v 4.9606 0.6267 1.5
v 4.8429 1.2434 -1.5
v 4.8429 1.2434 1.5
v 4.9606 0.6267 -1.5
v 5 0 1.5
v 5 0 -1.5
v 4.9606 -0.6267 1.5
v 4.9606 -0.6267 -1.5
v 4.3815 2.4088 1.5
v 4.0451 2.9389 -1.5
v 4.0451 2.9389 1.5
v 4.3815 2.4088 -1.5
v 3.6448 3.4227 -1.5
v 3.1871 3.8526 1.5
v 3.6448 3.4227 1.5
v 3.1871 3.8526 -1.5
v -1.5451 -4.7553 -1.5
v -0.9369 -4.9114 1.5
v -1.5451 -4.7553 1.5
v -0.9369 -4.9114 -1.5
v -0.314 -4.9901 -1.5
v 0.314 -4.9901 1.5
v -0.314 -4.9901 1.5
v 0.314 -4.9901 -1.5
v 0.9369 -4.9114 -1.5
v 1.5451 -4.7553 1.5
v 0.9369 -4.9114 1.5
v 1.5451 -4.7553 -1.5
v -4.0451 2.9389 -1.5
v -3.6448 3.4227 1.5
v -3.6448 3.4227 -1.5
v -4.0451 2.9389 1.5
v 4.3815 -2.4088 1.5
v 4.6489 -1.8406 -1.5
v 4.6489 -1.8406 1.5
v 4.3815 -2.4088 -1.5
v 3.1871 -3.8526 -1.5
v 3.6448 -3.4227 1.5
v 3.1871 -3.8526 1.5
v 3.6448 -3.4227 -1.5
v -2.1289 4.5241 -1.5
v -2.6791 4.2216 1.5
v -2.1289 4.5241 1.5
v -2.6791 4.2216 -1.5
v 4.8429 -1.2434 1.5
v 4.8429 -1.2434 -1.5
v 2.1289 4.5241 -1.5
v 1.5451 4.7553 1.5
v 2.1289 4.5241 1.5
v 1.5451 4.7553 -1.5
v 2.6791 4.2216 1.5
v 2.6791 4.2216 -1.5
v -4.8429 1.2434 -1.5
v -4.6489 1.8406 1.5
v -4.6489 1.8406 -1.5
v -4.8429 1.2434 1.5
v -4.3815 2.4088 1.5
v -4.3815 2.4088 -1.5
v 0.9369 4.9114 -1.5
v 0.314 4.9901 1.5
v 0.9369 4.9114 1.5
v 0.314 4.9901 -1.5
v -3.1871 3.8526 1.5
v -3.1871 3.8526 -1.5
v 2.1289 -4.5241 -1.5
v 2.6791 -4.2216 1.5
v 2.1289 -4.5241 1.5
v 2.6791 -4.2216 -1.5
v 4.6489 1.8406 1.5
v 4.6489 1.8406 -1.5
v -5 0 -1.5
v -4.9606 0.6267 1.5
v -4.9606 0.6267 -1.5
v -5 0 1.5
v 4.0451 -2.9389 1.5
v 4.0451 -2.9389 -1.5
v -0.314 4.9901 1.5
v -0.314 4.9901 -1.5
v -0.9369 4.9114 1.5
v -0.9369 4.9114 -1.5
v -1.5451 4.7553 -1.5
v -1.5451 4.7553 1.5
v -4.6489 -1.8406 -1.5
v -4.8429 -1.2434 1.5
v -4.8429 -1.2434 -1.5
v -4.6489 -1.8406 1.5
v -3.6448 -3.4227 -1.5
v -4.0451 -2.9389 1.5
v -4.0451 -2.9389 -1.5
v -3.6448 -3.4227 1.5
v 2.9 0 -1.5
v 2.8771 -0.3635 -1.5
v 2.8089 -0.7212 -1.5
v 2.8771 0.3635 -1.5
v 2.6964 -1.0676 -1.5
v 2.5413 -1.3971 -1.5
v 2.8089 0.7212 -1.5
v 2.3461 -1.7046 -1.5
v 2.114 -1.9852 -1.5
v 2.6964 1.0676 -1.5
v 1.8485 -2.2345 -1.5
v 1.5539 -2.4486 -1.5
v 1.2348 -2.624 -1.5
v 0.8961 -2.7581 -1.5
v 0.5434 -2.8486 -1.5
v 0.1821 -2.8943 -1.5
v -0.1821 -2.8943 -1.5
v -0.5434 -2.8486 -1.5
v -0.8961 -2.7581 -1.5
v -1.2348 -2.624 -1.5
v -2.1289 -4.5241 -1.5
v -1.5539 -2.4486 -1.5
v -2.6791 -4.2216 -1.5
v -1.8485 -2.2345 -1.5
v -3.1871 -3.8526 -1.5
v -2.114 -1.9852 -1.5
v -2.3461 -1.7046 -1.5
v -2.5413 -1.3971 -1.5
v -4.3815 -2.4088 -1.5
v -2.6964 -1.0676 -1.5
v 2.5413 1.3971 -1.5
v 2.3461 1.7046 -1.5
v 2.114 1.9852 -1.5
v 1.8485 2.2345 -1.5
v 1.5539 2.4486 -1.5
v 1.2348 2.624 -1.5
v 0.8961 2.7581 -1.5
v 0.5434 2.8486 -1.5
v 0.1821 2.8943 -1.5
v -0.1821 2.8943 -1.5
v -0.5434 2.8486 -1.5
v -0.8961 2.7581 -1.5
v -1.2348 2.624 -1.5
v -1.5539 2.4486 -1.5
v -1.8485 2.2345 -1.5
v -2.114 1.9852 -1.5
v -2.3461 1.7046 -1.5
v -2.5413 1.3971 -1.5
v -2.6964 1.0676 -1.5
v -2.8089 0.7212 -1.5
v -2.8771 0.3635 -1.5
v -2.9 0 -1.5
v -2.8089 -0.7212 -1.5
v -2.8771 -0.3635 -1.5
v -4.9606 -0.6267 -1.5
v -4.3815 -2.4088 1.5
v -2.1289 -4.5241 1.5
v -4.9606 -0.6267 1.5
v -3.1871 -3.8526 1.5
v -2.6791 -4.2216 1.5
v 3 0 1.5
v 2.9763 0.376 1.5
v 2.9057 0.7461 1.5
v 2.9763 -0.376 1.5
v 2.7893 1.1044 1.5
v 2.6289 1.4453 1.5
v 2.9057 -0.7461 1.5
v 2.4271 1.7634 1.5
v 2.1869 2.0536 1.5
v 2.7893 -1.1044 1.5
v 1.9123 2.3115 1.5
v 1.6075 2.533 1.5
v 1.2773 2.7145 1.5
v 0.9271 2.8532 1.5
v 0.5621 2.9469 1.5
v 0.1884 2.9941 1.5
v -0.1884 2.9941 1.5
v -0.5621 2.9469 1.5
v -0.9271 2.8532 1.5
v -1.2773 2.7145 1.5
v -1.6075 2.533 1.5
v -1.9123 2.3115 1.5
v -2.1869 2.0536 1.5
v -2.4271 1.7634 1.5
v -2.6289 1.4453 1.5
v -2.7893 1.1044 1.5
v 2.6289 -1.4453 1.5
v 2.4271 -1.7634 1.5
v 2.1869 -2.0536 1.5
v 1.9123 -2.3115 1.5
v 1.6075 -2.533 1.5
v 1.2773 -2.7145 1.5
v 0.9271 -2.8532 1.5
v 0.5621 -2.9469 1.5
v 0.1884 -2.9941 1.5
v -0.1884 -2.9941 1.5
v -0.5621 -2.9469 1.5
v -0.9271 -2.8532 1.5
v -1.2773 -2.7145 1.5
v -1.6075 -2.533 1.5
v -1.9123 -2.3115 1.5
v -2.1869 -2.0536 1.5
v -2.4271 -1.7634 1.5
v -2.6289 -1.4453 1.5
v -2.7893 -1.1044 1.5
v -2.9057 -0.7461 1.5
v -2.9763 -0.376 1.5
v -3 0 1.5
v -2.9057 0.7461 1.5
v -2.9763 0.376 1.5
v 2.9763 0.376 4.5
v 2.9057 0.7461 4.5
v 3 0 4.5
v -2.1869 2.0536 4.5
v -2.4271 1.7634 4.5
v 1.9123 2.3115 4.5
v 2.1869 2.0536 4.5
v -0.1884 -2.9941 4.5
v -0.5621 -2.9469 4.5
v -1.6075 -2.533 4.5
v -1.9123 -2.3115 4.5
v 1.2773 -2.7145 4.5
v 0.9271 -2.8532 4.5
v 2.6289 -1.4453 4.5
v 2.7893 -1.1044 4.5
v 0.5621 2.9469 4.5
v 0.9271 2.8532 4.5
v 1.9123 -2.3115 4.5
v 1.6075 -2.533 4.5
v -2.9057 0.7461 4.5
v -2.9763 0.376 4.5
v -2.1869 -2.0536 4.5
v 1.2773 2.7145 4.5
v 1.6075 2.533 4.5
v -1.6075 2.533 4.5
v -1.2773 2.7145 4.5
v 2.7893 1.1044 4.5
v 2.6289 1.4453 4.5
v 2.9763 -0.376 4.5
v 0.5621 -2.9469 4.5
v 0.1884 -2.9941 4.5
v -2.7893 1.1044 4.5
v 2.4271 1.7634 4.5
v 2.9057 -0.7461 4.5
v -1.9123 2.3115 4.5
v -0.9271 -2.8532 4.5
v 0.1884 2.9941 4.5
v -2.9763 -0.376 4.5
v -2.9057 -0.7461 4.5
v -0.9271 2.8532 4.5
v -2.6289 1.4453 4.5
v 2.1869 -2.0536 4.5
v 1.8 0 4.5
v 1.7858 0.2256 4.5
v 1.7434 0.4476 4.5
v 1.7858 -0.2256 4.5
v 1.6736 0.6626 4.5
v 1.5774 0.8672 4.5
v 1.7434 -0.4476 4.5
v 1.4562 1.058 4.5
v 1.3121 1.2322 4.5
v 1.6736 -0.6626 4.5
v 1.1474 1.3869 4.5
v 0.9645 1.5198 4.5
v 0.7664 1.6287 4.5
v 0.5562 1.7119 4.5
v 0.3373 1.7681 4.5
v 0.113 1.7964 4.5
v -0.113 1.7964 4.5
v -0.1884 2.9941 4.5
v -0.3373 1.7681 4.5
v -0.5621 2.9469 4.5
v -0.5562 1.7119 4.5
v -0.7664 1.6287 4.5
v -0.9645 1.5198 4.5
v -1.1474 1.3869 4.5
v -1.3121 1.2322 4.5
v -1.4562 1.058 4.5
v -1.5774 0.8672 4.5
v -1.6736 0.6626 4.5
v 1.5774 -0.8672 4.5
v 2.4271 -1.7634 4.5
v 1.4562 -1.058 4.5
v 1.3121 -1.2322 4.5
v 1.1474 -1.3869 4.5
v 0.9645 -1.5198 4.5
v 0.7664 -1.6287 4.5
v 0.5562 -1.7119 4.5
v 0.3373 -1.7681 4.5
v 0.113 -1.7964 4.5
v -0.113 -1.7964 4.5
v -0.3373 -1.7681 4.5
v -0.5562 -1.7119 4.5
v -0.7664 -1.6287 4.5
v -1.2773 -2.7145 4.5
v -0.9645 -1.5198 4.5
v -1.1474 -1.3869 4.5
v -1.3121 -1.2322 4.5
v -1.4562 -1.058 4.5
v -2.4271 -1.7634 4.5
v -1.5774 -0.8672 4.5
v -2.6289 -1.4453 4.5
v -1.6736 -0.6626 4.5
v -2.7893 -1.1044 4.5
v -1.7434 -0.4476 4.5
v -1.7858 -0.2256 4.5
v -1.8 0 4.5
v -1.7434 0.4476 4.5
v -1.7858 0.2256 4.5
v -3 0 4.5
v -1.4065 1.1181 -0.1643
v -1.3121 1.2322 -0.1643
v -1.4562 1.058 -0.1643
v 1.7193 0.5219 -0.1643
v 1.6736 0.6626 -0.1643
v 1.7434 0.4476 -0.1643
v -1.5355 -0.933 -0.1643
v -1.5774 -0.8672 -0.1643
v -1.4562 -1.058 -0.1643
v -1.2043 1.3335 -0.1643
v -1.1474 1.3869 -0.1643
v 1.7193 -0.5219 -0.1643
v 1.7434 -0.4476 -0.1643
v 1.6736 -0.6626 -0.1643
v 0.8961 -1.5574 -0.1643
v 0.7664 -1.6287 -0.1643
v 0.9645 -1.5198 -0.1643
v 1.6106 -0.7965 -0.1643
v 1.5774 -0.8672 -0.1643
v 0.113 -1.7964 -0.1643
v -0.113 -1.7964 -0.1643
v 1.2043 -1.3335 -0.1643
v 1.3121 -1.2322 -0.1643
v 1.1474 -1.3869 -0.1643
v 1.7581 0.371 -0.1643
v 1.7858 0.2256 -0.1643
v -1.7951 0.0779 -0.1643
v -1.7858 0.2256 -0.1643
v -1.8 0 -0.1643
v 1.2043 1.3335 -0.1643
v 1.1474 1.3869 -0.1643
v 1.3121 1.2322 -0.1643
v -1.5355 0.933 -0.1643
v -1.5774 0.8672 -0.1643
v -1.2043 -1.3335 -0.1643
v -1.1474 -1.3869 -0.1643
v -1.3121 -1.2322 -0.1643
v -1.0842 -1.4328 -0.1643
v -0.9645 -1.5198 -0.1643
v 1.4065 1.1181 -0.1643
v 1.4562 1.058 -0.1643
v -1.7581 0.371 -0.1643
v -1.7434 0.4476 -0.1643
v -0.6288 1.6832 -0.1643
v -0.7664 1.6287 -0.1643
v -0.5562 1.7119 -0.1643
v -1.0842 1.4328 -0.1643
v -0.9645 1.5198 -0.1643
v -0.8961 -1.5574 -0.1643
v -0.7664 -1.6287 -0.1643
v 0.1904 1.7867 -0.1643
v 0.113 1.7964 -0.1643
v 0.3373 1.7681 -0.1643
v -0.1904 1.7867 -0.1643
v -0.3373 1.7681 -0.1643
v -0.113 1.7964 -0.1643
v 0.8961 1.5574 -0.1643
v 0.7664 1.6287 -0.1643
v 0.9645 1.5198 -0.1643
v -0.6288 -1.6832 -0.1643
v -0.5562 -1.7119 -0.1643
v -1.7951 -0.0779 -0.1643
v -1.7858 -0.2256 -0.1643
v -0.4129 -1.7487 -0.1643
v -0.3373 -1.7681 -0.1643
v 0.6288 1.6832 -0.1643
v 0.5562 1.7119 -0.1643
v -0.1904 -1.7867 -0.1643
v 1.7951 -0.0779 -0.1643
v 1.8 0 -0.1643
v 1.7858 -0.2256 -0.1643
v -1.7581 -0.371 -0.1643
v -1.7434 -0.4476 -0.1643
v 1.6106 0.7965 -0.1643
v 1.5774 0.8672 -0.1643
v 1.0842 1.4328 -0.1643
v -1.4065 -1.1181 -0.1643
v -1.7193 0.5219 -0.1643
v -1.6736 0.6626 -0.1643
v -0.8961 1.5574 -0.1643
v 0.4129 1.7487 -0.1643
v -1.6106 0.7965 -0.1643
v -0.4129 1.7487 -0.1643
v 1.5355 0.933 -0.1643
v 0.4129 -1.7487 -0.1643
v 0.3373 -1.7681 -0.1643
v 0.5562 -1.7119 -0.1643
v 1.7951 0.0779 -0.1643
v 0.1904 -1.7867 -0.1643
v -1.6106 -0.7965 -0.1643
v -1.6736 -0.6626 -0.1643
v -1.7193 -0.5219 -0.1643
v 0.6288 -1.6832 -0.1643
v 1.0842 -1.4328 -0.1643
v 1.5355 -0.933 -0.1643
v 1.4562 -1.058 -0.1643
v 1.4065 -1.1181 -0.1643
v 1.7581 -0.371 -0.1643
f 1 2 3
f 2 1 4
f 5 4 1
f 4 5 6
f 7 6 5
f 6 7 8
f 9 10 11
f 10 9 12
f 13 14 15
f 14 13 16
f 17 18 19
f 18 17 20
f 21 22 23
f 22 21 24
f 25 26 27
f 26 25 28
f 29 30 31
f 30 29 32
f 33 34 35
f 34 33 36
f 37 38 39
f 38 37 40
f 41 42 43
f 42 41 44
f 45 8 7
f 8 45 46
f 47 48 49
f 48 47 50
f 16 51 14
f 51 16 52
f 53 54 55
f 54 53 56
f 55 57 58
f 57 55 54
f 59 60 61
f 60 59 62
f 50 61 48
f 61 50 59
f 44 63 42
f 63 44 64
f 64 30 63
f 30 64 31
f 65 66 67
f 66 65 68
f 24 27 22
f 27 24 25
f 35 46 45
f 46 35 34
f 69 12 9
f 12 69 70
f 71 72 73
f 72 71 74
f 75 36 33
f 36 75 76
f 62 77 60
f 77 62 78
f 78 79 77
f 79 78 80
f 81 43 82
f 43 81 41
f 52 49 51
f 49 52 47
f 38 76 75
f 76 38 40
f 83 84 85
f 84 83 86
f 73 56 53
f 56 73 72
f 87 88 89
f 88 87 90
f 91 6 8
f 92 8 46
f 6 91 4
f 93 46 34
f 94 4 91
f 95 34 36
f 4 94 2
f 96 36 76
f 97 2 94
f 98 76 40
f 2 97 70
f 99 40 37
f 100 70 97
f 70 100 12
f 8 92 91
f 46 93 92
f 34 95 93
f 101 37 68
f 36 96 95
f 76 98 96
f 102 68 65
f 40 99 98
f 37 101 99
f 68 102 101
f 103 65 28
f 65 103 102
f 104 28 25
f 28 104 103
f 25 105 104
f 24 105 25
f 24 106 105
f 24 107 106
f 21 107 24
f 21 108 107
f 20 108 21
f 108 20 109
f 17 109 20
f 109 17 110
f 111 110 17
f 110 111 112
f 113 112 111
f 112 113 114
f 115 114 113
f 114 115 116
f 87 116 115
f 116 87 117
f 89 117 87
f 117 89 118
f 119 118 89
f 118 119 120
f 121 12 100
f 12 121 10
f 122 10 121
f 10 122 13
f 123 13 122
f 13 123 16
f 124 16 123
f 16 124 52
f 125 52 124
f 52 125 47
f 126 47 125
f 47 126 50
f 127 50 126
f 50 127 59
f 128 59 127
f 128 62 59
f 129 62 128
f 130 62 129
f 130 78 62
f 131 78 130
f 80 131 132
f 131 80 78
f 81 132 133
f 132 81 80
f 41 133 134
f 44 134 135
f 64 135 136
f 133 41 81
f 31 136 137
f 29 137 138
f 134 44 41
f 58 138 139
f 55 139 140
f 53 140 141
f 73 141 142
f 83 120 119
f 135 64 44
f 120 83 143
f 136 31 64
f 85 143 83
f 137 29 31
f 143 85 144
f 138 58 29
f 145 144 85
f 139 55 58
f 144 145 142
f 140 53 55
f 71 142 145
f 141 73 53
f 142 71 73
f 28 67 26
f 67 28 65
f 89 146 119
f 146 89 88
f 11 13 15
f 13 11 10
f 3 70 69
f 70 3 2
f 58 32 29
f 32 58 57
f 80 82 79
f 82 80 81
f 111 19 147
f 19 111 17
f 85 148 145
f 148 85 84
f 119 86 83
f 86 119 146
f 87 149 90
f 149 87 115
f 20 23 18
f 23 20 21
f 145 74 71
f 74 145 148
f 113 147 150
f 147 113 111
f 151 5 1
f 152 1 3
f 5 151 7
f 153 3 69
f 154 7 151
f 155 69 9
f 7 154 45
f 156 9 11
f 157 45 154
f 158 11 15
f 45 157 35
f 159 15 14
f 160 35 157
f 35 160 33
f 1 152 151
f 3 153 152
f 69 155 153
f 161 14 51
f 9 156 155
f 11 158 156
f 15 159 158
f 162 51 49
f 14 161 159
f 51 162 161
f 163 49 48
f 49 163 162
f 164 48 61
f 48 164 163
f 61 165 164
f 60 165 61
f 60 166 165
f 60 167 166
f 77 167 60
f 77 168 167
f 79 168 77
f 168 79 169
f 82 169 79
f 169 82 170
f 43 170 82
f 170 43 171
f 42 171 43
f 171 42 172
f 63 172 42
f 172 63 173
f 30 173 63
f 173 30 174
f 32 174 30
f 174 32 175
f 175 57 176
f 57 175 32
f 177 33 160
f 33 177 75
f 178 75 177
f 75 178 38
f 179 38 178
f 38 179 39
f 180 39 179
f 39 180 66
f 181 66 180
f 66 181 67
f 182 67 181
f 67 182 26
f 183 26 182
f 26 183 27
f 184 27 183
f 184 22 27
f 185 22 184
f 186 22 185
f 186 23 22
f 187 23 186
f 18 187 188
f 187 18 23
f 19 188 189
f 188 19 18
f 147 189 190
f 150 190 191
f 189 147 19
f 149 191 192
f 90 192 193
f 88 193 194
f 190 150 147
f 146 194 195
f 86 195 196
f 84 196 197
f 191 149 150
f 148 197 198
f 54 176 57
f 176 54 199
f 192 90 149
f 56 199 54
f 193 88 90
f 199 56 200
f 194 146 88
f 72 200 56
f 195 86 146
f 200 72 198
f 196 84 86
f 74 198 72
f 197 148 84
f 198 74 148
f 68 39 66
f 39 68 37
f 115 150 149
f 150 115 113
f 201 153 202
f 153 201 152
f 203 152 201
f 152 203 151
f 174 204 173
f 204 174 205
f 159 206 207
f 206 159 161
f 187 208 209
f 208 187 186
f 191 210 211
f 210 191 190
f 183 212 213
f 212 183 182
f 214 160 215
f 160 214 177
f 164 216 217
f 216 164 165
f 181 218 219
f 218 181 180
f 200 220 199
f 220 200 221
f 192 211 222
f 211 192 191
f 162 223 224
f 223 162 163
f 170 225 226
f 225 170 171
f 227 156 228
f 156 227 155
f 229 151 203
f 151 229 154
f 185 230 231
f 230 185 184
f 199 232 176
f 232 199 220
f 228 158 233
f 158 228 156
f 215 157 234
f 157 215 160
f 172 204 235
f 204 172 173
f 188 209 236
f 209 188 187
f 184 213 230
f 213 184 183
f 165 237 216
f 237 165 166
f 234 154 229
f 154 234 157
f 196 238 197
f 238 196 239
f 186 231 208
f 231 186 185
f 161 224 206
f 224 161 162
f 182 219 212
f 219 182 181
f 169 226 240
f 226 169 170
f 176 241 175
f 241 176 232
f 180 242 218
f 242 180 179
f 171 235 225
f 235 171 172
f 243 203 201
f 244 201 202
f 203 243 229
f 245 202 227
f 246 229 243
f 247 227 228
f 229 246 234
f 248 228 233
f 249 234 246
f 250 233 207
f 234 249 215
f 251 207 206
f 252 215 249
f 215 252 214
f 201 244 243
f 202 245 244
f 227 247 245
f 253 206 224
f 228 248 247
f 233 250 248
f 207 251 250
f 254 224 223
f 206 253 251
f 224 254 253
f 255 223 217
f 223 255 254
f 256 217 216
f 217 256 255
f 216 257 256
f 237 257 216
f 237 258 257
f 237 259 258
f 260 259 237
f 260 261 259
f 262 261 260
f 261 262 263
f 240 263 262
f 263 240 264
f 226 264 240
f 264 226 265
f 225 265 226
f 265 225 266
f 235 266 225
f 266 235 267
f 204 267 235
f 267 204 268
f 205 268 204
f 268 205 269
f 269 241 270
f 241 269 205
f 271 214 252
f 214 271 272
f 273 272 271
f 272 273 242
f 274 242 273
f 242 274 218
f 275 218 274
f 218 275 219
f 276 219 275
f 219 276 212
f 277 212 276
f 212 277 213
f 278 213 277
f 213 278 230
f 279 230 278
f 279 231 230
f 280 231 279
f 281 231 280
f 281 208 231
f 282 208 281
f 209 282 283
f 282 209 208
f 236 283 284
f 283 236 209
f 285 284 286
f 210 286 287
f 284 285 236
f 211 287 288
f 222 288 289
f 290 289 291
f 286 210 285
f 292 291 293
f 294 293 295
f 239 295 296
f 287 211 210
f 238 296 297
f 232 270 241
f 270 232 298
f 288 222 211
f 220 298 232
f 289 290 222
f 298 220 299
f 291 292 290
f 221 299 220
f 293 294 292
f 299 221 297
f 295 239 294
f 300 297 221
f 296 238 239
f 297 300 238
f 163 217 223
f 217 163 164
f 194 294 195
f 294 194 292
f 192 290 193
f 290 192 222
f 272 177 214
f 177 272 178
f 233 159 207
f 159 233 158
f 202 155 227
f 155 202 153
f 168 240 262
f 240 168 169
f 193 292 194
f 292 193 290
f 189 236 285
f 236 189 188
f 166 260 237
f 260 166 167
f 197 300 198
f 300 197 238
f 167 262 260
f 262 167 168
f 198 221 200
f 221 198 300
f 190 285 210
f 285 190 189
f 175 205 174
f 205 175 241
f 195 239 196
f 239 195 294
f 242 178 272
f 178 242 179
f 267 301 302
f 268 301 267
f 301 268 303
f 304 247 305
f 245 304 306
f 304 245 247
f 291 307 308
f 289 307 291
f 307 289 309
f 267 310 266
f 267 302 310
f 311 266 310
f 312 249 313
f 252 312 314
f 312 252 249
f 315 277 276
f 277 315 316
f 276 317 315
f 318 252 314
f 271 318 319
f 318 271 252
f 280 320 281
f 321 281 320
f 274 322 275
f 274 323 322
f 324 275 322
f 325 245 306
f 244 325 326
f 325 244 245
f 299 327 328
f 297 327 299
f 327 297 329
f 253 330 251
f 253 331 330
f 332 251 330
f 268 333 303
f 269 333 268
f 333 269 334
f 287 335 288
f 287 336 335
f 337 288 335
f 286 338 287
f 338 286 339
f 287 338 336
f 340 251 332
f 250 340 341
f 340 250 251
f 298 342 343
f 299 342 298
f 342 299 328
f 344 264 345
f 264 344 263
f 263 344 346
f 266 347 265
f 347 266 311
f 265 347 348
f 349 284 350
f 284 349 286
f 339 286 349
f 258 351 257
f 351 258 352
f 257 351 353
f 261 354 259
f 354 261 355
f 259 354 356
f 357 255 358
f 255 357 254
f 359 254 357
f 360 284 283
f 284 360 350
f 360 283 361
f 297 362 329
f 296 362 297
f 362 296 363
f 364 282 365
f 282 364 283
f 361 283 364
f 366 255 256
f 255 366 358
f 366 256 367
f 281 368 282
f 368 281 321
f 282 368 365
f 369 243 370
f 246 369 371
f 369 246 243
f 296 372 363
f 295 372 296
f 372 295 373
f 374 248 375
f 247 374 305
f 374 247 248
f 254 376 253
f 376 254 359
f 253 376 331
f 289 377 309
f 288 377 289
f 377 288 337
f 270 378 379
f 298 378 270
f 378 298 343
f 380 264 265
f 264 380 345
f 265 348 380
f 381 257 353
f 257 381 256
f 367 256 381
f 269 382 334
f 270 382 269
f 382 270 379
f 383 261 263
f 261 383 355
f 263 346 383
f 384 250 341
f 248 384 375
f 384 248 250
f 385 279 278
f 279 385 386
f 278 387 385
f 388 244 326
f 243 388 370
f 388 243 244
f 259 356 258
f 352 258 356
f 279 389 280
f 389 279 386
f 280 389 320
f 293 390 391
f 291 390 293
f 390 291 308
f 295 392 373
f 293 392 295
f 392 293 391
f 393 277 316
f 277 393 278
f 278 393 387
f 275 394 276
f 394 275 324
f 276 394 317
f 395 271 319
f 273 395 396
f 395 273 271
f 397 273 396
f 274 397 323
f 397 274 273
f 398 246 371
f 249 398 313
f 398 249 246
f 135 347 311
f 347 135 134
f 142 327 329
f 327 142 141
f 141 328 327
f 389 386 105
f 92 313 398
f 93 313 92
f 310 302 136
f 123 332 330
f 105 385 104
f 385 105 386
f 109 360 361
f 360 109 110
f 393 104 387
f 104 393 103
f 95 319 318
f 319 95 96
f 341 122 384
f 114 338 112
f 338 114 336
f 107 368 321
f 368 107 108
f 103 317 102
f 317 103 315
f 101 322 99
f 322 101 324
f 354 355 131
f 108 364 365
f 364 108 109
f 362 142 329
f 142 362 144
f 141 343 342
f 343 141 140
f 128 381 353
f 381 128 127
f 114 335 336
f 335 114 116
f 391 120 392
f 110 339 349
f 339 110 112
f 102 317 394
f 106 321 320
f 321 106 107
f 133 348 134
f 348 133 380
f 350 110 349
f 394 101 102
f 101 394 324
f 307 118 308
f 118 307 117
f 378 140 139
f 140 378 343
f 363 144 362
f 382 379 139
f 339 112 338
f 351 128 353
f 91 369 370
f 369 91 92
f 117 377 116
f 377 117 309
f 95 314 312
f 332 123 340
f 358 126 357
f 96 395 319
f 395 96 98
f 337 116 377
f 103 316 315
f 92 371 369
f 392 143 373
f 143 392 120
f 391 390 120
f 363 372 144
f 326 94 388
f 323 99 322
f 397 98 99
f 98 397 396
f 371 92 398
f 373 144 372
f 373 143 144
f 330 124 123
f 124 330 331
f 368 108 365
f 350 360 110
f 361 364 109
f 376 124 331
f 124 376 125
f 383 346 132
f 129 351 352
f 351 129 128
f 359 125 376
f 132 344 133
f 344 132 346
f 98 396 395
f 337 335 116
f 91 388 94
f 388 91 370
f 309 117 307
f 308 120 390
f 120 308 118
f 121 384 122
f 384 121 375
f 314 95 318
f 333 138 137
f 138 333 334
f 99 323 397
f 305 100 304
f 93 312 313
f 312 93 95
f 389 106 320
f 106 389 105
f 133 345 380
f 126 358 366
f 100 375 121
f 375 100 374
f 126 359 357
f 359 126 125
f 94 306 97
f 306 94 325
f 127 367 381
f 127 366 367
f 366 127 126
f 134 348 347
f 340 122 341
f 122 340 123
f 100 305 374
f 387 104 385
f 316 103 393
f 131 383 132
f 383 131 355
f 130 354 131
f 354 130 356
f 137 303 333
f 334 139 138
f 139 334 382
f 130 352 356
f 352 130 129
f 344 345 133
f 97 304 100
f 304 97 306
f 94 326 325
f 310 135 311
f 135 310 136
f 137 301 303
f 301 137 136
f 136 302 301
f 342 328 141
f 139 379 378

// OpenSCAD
$fn = 50;


difference() {
	union() {
		translate(v = [0, 0, -1.5000000000]) {
			cylinder(h = 3, r = 5.0000000000);
		}
		translate(v = [0, 0, -1.5000000000]) {
			cylinder(h = 6, r = 3.0000000000);
		}
	}
	union() {
		translate(v = [0, 0, -1.5000000000]) {
			rotate(a = [0, 180, 0]) {
				difference() {
					union() {
						translate(v = [0, 0, -6.0000000000]) {
							cylinder(h = 6, r = 1.5000000000);
						}
						translate(v = [0, 0, -6.0000000000]) {
							cylinder(h = 6, r = 1.8000000000);
						}
						translate(v = [0, 0, -1.7000000000]) {
							cylinder(h = 1.7000000000, r1 = 1.5000000000, r2 = 2.9000000000);
						}
						translate(v = [0, 0, -6.0000000000]) {
							cylinder(h = 6, r = 1.5000000000);
						}
					}
					union();
				}
			}
		}
		translate(v = [0, 0, -100.0000000000]) {
			cylinder(h = 200, r = 1.5000000000);
		}
	}
}
